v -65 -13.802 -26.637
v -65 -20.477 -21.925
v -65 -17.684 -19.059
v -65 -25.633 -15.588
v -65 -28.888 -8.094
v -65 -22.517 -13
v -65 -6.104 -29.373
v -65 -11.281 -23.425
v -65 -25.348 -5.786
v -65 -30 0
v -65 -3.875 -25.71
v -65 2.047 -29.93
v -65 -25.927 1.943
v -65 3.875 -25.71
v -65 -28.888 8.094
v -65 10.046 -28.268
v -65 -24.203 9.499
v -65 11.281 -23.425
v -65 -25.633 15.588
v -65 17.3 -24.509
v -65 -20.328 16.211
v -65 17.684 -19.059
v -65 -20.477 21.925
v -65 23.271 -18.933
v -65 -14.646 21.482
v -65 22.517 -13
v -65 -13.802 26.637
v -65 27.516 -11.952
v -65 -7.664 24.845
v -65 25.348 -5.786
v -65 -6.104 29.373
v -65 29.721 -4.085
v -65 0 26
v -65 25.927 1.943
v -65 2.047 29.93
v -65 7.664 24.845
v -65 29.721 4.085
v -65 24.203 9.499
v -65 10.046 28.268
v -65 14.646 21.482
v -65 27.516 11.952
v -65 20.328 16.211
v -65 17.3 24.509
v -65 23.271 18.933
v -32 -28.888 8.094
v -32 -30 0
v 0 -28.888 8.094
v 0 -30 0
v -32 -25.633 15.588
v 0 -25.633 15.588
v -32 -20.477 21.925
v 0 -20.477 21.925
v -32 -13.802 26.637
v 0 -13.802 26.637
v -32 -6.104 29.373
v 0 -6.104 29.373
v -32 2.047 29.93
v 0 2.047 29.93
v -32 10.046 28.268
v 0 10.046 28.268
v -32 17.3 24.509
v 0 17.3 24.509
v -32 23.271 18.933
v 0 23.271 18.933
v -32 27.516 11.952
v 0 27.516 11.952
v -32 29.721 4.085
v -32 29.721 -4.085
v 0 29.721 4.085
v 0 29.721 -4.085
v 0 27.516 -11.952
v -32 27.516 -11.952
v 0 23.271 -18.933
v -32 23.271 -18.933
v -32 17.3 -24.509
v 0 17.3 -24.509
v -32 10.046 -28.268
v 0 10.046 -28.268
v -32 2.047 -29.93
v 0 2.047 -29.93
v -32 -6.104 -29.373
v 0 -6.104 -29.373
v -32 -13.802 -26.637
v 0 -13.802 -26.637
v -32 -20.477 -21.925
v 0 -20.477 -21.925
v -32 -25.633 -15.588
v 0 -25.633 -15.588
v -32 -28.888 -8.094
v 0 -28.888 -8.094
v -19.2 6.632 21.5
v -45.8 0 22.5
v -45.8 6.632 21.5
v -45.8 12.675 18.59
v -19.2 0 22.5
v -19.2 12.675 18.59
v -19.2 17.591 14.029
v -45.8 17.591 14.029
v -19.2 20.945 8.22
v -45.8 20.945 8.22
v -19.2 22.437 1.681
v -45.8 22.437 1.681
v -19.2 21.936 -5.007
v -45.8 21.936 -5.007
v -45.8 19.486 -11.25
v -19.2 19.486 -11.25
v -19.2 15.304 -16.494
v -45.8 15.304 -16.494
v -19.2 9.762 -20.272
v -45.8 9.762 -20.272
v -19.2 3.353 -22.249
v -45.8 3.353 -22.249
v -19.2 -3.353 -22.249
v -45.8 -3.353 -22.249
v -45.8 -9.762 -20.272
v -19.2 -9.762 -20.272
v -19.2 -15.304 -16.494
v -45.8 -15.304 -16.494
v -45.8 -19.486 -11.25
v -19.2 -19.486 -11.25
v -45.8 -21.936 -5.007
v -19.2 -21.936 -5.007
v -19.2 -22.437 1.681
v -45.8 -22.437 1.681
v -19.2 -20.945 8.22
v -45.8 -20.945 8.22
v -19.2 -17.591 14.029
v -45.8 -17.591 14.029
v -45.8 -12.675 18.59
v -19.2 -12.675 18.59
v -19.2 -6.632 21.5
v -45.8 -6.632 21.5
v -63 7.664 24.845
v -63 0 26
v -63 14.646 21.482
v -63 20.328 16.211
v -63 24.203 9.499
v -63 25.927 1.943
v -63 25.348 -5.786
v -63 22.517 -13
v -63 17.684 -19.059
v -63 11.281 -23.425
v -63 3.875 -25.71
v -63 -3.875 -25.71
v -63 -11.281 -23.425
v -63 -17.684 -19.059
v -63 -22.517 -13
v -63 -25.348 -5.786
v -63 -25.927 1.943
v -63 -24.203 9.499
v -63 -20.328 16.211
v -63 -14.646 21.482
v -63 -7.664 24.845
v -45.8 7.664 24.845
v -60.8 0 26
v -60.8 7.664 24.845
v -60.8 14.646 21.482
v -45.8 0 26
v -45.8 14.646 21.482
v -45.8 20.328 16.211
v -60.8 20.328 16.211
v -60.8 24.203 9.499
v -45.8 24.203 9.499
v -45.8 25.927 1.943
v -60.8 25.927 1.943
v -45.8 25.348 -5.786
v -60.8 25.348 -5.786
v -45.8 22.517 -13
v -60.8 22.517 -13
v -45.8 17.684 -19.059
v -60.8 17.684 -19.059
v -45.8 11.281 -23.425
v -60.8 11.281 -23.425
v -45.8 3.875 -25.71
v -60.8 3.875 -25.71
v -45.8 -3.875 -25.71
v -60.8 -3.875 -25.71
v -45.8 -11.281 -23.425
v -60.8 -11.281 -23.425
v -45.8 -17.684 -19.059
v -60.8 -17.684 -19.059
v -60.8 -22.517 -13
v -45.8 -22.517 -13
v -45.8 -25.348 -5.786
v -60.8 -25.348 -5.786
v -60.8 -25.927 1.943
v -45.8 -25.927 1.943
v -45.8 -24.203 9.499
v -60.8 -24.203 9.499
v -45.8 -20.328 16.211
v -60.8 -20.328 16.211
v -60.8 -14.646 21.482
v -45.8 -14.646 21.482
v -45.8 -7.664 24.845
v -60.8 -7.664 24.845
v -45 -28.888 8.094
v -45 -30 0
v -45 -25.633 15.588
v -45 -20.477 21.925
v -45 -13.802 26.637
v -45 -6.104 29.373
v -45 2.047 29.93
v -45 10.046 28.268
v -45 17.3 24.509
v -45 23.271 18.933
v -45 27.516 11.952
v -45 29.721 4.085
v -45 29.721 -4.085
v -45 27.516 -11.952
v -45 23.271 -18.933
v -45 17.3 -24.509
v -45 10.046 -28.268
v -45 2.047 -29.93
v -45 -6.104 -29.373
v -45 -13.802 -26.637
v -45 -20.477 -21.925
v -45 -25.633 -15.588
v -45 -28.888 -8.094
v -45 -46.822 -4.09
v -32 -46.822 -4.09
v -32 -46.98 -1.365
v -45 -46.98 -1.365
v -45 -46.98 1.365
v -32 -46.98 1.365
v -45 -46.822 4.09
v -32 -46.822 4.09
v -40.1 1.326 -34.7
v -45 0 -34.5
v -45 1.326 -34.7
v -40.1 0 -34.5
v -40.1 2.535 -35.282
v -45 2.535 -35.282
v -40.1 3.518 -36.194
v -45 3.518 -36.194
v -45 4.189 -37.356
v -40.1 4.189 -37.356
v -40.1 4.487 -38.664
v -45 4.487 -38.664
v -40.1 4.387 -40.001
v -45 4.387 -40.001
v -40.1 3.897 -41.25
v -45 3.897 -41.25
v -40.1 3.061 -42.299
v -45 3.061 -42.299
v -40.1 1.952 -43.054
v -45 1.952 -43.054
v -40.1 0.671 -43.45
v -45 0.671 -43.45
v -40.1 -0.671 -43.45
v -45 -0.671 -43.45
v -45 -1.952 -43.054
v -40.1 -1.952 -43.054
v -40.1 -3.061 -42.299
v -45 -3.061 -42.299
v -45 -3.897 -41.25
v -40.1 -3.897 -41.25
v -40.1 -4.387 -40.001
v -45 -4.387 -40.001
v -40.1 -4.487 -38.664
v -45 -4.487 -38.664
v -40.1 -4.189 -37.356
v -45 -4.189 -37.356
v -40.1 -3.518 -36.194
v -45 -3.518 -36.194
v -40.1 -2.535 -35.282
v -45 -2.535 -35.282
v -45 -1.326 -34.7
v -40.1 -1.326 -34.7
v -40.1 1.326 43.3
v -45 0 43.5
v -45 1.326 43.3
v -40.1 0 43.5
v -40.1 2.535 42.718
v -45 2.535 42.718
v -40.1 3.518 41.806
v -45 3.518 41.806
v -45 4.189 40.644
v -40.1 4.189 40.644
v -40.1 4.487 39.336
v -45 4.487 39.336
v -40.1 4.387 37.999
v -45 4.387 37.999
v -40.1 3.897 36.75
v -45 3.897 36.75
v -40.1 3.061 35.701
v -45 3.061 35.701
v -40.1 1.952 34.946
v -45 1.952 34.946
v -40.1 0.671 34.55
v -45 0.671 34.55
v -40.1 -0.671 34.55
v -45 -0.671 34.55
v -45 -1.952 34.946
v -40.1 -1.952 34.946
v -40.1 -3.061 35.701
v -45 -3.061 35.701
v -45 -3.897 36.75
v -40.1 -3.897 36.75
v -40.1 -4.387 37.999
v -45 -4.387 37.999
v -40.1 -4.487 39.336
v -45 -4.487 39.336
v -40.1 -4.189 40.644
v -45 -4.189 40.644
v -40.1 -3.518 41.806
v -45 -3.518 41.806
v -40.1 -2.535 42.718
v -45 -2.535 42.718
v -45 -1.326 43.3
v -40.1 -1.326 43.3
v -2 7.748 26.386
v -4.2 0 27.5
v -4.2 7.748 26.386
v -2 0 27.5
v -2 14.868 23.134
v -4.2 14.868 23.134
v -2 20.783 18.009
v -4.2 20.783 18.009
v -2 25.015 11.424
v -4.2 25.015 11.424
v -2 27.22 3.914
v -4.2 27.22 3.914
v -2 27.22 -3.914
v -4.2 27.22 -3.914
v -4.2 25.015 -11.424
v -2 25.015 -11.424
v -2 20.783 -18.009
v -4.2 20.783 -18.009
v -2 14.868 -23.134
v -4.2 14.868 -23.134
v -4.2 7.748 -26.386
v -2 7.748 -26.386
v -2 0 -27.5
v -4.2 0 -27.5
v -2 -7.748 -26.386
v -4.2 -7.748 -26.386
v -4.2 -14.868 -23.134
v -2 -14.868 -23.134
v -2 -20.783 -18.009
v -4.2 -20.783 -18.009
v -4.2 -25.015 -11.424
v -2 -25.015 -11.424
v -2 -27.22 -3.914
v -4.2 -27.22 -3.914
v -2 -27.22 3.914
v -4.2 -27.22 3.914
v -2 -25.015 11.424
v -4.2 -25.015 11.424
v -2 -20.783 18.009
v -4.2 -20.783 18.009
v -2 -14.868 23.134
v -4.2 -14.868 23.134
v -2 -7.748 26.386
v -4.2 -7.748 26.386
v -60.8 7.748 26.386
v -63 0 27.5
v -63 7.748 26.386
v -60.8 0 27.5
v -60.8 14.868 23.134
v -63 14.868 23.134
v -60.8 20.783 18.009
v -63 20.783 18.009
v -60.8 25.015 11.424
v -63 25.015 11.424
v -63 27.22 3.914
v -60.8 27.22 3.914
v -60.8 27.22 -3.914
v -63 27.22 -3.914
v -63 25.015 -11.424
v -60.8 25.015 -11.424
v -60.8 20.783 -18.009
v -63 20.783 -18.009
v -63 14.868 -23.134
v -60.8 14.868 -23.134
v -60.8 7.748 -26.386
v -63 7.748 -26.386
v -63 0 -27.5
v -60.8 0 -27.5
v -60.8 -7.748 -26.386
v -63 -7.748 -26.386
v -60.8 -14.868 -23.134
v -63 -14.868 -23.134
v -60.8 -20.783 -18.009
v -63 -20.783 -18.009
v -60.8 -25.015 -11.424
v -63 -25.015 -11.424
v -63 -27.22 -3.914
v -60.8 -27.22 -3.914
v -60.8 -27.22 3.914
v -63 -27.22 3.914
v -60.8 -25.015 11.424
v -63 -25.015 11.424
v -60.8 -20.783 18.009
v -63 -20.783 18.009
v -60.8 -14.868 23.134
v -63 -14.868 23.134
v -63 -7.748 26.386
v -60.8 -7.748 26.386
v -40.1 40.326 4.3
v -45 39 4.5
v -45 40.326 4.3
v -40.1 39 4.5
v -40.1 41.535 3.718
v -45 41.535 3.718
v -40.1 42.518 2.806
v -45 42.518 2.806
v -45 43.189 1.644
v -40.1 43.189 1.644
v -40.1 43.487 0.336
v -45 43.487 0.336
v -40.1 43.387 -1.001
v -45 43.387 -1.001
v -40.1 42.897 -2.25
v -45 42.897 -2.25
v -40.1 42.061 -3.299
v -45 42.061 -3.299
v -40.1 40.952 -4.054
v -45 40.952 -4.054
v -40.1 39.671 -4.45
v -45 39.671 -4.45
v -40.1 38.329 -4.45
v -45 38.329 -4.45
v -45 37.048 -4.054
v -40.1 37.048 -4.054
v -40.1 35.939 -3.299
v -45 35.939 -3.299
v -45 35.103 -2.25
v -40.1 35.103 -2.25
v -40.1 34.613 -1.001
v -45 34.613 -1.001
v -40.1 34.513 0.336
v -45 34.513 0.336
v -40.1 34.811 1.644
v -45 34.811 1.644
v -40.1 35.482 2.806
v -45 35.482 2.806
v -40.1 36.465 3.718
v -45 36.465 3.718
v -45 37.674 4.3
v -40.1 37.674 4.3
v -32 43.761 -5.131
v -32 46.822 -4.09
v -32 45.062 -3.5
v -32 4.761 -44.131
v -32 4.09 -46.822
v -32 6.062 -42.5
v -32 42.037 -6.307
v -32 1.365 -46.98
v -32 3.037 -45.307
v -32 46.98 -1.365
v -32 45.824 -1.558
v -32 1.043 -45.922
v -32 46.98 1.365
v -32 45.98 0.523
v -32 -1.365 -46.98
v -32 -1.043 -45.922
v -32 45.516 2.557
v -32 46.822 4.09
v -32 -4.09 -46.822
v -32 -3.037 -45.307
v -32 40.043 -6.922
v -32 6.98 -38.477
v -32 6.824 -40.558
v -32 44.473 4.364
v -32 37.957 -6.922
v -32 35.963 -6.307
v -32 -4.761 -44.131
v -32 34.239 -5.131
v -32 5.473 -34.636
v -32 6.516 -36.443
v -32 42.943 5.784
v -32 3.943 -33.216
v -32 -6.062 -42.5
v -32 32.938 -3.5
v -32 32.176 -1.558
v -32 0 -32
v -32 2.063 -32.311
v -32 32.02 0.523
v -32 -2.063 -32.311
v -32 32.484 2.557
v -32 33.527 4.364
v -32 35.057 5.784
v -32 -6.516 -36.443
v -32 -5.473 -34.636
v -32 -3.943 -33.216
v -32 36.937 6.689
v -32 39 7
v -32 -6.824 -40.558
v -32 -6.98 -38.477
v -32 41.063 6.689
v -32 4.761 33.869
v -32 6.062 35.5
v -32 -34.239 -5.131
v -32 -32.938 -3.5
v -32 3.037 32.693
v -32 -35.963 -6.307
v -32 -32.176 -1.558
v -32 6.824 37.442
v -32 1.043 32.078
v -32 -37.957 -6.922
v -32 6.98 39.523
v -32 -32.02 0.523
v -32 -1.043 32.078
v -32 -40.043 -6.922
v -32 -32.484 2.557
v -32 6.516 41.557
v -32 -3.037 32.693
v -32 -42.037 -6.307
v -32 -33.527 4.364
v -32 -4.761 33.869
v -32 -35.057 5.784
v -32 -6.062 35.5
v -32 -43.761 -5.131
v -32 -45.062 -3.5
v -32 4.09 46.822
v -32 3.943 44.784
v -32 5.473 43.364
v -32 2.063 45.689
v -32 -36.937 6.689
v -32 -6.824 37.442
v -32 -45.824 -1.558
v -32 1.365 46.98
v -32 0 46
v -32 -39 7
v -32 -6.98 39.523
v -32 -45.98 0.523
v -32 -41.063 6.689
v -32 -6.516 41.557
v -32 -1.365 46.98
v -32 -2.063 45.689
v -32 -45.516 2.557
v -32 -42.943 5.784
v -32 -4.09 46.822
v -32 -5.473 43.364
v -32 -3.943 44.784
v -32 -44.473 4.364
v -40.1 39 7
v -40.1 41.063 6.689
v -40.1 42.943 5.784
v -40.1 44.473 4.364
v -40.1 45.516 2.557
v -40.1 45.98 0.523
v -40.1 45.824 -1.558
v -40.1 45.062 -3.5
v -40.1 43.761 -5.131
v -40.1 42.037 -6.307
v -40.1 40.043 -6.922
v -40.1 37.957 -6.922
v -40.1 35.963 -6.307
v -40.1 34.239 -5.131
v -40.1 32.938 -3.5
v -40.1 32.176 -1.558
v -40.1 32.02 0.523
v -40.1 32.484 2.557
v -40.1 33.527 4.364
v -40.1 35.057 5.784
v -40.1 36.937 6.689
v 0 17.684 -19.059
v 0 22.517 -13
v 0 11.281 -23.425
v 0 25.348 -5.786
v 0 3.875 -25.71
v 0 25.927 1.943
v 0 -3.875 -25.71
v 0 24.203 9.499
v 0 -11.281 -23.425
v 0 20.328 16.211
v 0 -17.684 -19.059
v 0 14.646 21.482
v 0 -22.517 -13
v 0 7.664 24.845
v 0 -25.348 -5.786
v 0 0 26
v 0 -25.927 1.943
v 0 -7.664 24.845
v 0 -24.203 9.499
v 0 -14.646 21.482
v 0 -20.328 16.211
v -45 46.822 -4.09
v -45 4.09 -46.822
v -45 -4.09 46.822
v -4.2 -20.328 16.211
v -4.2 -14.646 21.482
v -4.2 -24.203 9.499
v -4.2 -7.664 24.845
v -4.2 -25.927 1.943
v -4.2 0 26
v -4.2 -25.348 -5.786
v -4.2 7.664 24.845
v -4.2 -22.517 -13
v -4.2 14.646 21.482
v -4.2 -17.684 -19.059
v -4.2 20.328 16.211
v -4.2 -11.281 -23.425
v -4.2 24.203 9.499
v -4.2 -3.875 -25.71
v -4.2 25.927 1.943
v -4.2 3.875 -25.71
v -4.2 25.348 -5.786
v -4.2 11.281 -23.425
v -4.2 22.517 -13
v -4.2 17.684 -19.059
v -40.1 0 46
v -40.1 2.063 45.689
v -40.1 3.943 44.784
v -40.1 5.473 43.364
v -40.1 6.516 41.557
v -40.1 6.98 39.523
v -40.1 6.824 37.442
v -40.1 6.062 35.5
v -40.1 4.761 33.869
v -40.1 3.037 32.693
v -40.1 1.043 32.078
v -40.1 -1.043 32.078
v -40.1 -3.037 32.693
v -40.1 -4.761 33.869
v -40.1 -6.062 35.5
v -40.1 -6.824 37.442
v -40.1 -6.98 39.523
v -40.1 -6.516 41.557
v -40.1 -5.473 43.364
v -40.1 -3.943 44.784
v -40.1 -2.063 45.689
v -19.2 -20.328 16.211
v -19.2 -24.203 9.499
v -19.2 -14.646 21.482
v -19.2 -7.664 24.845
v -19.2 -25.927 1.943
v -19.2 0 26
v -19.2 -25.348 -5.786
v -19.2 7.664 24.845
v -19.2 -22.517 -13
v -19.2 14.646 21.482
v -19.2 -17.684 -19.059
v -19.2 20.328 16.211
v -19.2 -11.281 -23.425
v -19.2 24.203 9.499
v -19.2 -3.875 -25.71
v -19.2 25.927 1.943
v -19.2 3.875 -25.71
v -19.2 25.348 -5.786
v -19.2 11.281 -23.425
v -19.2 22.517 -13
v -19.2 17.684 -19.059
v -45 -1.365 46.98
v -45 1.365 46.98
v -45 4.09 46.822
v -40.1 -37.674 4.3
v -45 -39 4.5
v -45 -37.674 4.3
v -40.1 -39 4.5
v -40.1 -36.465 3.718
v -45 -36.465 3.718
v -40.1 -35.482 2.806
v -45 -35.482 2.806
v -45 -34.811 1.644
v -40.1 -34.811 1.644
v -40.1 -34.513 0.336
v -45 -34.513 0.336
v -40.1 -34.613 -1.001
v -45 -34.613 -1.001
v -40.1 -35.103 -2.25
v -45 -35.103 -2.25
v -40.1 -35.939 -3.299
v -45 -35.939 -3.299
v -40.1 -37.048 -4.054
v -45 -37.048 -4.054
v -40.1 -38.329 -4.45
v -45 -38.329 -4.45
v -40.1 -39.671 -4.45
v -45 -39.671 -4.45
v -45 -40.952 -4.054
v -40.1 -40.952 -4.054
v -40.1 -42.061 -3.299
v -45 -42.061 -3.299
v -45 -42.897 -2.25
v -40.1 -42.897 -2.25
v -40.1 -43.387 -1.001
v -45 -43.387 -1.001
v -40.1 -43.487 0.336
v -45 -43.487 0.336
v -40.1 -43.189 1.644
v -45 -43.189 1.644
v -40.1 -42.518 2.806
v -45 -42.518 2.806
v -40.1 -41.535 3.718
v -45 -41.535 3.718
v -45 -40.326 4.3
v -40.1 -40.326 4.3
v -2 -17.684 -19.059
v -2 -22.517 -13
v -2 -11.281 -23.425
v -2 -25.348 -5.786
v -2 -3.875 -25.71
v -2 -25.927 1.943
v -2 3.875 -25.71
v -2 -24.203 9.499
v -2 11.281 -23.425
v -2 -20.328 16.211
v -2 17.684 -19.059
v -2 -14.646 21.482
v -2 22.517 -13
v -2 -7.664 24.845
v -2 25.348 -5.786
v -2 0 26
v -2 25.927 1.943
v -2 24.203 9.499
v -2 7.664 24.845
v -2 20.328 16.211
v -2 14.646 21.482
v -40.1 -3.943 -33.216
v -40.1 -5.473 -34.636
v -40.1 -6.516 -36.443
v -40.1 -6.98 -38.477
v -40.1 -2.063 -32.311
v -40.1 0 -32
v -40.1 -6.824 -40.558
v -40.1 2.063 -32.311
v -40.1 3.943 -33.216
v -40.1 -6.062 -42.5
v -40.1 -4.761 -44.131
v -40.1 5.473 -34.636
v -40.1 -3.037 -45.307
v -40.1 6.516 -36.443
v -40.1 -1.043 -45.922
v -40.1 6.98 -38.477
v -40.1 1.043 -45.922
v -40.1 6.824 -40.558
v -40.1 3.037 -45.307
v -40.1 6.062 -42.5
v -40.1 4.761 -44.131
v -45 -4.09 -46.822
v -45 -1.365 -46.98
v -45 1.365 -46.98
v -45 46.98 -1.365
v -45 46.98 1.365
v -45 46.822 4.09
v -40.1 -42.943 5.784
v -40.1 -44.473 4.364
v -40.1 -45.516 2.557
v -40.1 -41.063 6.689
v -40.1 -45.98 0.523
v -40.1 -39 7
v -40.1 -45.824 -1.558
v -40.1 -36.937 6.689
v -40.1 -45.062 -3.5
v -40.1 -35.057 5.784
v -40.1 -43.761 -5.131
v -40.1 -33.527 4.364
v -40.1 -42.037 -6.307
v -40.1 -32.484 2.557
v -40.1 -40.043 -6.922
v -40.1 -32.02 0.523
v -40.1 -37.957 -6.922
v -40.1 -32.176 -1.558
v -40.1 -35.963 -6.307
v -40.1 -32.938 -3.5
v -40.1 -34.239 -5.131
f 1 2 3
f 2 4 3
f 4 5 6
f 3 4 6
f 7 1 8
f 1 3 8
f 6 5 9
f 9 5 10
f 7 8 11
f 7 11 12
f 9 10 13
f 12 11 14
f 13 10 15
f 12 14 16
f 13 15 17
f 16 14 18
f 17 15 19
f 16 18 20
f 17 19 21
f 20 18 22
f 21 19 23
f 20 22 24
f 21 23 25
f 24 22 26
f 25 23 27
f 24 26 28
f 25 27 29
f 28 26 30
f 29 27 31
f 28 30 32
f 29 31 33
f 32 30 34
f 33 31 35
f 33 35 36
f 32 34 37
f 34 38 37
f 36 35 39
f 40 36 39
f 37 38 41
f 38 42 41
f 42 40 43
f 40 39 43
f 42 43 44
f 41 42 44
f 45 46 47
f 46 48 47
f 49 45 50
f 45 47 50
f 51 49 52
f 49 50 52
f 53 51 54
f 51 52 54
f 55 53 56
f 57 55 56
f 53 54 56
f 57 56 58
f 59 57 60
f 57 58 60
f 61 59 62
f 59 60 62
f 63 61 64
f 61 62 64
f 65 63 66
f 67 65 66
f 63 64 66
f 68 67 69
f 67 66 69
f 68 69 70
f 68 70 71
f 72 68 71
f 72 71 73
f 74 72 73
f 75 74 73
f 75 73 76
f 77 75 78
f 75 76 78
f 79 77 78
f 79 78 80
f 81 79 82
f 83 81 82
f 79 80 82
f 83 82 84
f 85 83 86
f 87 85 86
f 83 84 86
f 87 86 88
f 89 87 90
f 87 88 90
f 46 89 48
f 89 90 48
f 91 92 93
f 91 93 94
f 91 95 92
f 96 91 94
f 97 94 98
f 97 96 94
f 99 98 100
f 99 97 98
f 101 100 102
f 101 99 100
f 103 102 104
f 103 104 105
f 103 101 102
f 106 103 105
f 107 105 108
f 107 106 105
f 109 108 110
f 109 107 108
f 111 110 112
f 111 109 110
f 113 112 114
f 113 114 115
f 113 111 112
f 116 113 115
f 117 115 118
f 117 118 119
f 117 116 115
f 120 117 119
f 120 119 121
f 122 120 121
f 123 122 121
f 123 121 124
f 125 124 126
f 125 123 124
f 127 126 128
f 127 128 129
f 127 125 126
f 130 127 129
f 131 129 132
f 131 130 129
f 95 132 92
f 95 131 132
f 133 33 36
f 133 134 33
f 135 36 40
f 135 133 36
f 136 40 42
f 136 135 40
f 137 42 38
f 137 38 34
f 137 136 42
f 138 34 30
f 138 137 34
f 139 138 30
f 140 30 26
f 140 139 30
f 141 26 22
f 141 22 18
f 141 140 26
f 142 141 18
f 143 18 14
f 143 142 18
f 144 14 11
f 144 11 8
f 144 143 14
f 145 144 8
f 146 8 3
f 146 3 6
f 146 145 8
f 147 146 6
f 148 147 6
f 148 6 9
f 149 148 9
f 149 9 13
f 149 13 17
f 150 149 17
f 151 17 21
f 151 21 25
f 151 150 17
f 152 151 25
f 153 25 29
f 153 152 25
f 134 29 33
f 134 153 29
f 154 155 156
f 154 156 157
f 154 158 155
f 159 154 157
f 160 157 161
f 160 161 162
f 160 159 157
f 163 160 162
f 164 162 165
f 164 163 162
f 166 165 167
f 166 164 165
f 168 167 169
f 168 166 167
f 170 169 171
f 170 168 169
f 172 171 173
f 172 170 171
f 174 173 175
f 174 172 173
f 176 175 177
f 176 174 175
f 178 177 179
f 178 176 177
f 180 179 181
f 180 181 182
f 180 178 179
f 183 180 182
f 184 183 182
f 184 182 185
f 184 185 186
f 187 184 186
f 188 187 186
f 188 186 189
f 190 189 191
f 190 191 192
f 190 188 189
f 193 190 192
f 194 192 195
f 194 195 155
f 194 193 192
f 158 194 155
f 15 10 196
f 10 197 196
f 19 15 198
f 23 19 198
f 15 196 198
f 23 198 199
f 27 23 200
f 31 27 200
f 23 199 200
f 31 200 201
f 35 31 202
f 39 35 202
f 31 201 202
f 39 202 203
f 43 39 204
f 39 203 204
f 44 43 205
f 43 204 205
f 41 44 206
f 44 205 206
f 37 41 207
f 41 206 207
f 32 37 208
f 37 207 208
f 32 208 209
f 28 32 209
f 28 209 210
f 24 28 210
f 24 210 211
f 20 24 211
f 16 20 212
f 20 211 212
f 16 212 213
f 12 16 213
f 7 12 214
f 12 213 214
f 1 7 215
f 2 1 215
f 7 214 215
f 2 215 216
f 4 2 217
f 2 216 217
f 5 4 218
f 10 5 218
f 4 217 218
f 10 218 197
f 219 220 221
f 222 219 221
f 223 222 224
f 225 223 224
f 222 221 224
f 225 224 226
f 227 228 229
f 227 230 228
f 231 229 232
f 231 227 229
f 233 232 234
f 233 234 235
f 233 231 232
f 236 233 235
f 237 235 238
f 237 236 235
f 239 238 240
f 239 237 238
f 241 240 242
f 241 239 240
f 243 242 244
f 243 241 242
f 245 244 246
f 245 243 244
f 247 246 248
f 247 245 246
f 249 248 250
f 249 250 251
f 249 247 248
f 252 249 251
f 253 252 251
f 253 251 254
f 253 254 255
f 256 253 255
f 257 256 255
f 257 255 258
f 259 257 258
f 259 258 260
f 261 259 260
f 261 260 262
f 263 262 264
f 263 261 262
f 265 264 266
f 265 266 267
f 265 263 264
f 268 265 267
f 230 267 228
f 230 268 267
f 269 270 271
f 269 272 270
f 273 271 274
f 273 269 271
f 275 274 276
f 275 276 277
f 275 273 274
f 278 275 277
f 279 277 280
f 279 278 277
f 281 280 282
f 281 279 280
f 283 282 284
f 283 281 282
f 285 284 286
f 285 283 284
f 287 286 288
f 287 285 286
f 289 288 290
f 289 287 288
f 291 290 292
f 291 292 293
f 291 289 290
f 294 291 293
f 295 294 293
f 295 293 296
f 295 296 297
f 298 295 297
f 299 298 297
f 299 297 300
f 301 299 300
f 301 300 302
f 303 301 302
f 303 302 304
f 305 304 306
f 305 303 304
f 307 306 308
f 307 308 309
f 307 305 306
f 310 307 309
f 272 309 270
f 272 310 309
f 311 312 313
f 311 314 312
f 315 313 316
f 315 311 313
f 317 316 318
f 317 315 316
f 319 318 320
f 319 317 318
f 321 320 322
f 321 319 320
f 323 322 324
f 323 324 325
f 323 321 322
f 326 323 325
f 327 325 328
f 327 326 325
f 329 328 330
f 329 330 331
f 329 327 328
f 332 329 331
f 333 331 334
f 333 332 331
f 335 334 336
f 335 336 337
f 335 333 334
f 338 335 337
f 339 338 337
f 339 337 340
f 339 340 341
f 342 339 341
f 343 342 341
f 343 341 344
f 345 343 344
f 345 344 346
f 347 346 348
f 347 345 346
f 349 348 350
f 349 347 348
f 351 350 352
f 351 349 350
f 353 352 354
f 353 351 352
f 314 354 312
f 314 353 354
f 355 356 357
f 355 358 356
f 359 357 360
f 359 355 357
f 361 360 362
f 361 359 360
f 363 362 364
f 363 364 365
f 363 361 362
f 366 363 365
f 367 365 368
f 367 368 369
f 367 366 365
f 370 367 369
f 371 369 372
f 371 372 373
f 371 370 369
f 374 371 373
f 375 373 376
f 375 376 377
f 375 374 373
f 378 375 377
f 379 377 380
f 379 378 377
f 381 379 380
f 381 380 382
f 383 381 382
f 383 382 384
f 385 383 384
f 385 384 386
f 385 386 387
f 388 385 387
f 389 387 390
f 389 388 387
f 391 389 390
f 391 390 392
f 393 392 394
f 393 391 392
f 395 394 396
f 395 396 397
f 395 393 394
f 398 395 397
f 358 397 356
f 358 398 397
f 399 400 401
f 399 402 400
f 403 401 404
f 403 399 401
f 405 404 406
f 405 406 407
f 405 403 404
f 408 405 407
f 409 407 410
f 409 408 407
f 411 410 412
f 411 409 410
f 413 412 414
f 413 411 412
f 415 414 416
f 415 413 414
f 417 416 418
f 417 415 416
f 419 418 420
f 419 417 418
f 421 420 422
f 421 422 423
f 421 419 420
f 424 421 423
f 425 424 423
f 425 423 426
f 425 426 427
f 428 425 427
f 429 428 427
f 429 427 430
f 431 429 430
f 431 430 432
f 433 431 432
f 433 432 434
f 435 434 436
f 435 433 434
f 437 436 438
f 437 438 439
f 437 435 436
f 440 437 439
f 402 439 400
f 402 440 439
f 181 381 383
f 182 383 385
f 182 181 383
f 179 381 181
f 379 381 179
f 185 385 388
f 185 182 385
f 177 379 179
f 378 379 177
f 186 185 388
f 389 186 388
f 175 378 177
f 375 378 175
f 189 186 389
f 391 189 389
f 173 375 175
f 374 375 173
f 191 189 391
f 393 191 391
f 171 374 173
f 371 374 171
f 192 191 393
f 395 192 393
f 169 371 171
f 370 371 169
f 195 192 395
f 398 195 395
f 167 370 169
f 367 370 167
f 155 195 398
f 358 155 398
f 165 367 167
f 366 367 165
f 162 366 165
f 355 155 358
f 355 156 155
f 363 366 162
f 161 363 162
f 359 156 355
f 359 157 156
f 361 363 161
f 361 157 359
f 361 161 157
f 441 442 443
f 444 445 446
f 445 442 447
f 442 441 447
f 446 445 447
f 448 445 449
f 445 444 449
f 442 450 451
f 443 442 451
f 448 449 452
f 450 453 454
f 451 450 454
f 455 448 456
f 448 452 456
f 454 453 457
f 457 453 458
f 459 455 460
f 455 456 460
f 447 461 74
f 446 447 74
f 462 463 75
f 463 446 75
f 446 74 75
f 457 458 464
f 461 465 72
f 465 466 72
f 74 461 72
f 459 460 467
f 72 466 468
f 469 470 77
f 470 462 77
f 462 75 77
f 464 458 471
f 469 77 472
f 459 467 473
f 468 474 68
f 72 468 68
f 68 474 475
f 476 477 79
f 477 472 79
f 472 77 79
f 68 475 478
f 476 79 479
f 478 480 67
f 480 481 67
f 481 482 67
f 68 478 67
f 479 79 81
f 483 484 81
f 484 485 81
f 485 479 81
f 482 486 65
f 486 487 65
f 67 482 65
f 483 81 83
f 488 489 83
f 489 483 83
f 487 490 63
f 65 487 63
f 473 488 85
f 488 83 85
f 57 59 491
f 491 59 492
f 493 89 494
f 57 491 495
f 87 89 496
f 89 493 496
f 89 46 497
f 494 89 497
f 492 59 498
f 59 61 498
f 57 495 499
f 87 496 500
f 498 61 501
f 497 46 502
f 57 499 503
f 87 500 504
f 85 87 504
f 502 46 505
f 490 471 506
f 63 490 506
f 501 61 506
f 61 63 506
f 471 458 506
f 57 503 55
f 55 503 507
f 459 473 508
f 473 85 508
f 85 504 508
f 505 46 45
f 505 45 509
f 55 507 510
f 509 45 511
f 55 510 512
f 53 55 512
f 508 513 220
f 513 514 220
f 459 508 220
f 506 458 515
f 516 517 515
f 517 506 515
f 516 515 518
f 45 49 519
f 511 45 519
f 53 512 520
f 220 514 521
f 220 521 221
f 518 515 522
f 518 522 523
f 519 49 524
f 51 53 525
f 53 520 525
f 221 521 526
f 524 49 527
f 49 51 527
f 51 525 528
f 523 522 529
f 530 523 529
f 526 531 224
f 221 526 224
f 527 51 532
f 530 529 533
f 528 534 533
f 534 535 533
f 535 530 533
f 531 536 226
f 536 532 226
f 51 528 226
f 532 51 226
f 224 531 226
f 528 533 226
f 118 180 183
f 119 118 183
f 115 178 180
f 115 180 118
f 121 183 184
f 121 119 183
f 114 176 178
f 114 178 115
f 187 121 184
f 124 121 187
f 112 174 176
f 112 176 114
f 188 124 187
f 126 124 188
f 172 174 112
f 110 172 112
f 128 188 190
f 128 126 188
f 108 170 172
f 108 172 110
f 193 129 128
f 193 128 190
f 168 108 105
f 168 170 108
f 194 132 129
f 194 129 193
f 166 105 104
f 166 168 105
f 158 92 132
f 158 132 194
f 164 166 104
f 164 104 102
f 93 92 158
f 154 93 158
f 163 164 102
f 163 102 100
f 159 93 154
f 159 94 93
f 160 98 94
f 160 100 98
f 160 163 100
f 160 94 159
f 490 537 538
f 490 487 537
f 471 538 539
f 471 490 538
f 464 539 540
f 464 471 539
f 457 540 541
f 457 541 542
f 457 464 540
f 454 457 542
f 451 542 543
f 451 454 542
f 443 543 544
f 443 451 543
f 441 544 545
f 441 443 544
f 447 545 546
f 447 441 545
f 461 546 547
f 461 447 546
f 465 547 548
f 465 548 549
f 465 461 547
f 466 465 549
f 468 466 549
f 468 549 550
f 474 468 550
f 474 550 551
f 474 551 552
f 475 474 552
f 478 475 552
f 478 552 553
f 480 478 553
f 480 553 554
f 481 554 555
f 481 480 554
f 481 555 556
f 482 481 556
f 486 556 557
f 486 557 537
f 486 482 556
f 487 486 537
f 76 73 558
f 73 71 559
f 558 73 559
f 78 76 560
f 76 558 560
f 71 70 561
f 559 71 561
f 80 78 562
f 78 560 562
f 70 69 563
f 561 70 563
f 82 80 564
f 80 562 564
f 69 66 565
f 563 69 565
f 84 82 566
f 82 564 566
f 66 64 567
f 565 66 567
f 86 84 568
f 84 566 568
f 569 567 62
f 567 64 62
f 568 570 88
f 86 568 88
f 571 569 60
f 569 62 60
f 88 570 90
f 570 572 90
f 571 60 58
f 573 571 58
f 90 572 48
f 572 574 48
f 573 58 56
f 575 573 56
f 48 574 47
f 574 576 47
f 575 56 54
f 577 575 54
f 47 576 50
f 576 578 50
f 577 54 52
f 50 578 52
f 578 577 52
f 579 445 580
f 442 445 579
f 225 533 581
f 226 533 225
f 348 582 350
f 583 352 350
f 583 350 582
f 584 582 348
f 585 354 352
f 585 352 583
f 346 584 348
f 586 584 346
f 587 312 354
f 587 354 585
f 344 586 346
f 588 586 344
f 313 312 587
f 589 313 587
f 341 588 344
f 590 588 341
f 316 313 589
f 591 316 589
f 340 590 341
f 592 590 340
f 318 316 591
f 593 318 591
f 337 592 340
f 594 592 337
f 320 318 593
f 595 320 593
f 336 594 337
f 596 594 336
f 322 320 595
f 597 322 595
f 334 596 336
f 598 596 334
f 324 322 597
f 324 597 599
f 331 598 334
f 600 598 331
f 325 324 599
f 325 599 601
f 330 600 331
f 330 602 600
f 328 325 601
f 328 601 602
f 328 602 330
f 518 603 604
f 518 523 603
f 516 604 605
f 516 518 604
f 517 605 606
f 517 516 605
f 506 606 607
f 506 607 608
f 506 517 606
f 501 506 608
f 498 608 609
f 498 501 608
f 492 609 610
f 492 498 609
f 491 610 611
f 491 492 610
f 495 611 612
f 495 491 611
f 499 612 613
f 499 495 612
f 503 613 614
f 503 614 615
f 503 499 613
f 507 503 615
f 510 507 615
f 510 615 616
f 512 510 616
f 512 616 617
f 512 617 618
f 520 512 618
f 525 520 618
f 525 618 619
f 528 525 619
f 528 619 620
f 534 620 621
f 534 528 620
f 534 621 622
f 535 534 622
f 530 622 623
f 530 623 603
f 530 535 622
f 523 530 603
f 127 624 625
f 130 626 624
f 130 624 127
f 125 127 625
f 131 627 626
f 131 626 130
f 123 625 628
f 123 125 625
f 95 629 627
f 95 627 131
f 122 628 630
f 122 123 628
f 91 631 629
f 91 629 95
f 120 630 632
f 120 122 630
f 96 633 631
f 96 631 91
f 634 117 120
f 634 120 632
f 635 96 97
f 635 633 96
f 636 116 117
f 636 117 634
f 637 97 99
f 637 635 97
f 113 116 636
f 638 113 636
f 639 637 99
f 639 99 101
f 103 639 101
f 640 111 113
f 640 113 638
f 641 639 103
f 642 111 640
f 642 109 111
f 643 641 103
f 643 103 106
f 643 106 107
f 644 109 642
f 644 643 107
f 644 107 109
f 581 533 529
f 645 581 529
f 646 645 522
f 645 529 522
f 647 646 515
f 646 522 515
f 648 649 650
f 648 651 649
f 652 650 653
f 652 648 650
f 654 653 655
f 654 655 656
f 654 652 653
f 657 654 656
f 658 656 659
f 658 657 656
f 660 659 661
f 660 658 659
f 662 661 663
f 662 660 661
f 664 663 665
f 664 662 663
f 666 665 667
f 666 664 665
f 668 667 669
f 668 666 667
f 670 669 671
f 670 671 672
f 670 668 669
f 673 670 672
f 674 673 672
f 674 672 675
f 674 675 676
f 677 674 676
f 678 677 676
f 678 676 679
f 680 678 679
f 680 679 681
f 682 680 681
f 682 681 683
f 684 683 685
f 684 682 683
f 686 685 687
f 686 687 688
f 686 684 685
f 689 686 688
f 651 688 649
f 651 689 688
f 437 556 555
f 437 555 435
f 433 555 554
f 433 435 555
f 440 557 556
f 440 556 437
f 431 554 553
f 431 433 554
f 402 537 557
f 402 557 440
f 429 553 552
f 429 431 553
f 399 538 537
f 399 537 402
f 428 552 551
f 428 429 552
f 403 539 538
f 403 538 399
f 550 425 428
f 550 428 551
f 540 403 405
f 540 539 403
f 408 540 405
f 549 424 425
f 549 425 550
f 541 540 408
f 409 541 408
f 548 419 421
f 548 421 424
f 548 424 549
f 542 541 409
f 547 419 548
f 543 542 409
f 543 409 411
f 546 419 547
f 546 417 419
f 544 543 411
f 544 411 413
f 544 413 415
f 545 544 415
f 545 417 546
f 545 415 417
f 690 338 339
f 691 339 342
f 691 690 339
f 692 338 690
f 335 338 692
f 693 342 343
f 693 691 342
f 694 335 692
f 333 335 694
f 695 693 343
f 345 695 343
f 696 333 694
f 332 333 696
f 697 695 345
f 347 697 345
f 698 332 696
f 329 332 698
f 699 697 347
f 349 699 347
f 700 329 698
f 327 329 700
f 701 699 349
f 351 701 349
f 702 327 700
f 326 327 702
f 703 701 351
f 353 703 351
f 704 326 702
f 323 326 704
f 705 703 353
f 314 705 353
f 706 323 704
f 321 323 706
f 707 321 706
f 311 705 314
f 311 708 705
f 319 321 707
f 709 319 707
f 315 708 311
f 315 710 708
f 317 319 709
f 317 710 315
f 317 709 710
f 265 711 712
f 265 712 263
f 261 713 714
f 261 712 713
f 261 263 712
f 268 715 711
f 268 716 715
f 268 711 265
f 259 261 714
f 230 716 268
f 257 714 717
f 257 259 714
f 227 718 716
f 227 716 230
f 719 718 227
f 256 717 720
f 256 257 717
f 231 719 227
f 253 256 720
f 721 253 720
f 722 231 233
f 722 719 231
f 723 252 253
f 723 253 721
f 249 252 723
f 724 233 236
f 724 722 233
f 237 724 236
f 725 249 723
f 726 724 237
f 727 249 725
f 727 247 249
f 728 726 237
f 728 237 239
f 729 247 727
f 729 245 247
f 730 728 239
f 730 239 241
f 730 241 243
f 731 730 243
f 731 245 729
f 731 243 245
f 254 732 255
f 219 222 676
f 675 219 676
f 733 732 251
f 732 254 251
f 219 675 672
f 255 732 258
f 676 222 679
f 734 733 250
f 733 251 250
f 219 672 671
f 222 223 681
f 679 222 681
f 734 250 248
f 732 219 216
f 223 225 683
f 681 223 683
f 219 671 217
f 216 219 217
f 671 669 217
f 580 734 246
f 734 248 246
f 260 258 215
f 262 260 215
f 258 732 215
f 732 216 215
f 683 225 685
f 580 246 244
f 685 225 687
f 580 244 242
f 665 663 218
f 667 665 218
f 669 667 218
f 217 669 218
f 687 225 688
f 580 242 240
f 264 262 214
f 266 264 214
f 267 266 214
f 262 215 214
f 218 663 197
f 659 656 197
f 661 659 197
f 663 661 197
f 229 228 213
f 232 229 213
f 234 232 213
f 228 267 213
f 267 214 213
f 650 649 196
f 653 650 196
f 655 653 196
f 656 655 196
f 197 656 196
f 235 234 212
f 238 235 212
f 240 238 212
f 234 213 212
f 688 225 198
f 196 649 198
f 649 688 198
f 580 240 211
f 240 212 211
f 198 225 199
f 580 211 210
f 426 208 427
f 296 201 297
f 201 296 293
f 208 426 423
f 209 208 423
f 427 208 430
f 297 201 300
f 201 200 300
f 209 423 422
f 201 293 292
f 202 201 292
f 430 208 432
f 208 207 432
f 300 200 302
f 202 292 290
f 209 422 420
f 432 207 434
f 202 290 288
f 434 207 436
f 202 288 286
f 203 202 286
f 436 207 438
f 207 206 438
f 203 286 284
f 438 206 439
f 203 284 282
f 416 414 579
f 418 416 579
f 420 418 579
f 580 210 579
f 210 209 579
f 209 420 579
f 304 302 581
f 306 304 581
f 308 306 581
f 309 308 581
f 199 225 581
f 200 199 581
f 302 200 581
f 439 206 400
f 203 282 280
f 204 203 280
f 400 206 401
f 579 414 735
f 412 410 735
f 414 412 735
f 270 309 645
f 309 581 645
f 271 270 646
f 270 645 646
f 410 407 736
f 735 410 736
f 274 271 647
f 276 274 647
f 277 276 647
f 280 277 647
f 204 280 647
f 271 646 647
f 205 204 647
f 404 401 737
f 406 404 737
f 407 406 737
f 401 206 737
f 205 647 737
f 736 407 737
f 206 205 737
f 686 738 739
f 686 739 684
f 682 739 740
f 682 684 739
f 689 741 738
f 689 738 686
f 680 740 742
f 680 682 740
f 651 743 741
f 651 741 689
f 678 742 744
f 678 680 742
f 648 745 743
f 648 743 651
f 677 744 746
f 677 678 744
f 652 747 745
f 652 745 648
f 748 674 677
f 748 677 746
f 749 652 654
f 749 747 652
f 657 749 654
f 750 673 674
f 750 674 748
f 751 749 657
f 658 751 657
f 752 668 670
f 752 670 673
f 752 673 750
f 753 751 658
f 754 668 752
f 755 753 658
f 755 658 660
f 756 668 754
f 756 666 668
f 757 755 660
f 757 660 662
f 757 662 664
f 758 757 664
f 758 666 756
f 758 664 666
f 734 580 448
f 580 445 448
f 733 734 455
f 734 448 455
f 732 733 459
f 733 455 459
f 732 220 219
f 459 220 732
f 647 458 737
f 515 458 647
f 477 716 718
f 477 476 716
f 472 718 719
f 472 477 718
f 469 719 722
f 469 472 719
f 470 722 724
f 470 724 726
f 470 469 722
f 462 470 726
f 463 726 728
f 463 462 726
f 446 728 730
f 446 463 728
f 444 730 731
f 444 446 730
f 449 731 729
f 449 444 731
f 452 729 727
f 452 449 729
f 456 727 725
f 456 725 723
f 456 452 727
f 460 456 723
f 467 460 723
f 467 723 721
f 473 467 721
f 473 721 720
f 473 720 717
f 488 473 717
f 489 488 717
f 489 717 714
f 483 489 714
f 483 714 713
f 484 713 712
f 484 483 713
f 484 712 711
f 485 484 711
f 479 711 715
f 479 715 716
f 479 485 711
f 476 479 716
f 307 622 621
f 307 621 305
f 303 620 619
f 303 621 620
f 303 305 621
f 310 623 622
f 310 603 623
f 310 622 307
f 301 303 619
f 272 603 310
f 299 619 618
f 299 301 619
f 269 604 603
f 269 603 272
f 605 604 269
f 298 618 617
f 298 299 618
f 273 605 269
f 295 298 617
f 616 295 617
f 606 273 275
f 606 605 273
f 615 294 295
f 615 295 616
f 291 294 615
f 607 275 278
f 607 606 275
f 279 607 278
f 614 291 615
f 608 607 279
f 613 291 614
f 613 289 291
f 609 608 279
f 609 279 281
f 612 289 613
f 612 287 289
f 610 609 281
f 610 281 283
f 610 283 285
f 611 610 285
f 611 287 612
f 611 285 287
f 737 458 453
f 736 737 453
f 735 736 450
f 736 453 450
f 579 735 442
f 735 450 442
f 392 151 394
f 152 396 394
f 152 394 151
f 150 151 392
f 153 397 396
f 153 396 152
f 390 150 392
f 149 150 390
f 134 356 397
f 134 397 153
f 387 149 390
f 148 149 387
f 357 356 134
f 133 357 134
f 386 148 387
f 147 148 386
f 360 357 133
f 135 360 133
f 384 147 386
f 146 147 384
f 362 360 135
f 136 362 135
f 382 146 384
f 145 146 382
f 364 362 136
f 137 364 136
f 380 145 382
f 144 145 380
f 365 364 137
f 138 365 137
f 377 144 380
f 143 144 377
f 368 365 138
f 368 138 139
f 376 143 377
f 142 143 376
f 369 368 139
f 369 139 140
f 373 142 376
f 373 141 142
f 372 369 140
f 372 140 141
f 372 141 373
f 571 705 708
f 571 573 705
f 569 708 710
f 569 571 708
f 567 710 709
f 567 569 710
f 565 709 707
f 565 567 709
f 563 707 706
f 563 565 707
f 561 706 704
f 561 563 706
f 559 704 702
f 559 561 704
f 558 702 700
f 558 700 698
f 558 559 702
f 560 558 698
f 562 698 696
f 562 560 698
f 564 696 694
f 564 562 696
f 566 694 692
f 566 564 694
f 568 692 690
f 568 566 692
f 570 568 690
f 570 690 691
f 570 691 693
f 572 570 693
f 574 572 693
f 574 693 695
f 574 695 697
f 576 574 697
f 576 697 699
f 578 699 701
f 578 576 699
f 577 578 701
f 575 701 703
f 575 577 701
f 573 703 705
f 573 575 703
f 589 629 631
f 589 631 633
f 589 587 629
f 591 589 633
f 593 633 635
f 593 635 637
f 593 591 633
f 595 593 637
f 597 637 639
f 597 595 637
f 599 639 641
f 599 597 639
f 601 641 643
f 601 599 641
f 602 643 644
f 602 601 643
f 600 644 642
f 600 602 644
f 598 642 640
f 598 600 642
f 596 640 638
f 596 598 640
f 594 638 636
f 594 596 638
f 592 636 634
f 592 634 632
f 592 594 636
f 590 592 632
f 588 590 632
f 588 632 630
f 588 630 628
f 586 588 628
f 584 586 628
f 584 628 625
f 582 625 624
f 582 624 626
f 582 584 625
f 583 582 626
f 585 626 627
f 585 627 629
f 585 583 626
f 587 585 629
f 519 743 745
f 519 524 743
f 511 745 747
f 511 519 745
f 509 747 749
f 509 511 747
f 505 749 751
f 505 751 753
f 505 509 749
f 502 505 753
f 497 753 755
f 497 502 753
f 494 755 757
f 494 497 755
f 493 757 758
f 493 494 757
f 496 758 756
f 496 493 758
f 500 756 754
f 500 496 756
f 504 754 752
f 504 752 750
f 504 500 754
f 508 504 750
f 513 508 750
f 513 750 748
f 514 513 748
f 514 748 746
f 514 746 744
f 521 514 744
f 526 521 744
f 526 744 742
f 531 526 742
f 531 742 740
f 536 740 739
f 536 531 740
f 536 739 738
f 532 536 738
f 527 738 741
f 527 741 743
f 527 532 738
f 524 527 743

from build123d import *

# Parameters (mm, degrees)
SKETCH7_R          = 72
CUT_EXTRUDE1_DEPTH = 13


with BuildPart() as part:
    # Sketch1 → Revolve1 (revolve)
    with BuildSketch(Plane.XY, mode=Mode.PRIVATE) as revolve1_sk:
        Polygon((-65, 0), (-65, 30), (-45, 30), (-45, 47), (-32, 47), (-32, 30), (0, 30), (0, 0), align=None)
    revolve(revolve1_sk.sketch.rotate(Axis((0, 0, 0), (-1, 0, 0)), 180), axis=Axis((0, 0, 0), (-1, 0, 0)))

    # Sketch2 → Cut-Revolve1 (revolve, cut)
    with BuildSketch(Plane.XY, mode=Mode.PRIVATE) as cut_revolve1_sk:
        Polygon((-65, 0), (-65, 26), (-63, 26), (-63, 27.5), (-60.8, 27.5), (-60.8, 26), (-45.8, 26), (-45.8, 22.5), (-19.2, 22.5), (-19.2, 26), (-4.2, 26), (-4.2, 27.5), (-2, 27.5), (-2, 26), (0, 26), (0, 0), align=None)
    revolve(cut_revolve1_sk.sketch.rotate(Axis((0, 0, 0), (-1, 0, 0)), 270), axis=Axis((0, 0, 0), (-1, 0, 0)), mode=Mode.SUBTRACT)

    # Sketch3 → Cut-Revolve2 (revolve, cut)
    with BuildSketch(Plane.XY, mode=Mode.PRIVATE) as cut_revolve2_sk:
        Polygon((-45, 39), (-45, 43.5), (-40.1, 43.5), (-40.1, 46), (-32, 46), (-32, 39), align=None)
    revolve(cut_revolve2_sk.sketch.rotate(Axis((-32, 39, 0), (-1, 0, 0)), 270), axis=Axis((-32, 39, 0), (-1, 0, 0)), mode=Mode.SUBTRACT)

    # Sketch4 → Cut-Revolve3 (revolve, cut)
    with BuildSketch(Plane.XY.offset(39), mode=Mode.PRIVATE) as cut_revolve3_sk:
        Polygon((-45, 0), (-45, 4.5), (-40.1, 4.5), (-40.1, 7), (-32, 7), (-32, 0), align=None)
    revolve(cut_revolve3_sk.sketch.rotate(Axis((-32, 0, 39), (-1, 0, 0)), 270), axis=Axis((-32, 0, 39), (-1, 0, 0)), mode=Mode.SUBTRACT)

    # Sketch5 → Cut-Revolve4 (revolve, cut)
    with BuildSketch(Plane.XY, mode=Mode.PRIVATE) as cut_revolve4_sk:
        Polygon((-45, -39), (-45, -34.5), (-40.1, -34.5), (-40.1, -32), (-32, -32), (-32, -39), align=None)
    revolve(cut_revolve4_sk.sketch.rotate(Axis((-32, -39, 0), (-1, 0, 0)), 270), axis=Axis((-32, -39, 0), (-1, 0, 0)), mode=Mode.SUBTRACT)

    # Sketch6 → Cut-Revolve5 (revolve, cut)
    with BuildSketch(Plane.XY.offset(-39), mode=Mode.PRIVATE) as cut_revolve5_sk:
        Polygon((-45, 0), (-45, 4.5), (-40.1, 4.5), (-40.1, 7), (-32, 7), (-32, 0), align=None)
    revolve(cut_revolve5_sk.sketch.rotate(Axis((-32, 0, -39), (-1, 0, 0)), 270), axis=Axis((-32, 0, -39), (-1, 0, 0)), mode=Mode.SUBTRACT)

    # Sketch7 → Cut-Extrude1 (cut)
    with BuildSketch(Plane(origin=(-32, 0, 0), x_dir=(0, 0, -1), z_dir=(1, 0, 0))):
        Circle(SKETCH7_R)
        Polygon((-50.911688245, 0), (0, -50.911688245), (50.911688245, 0), (0, 50.911688245), align=None, mode=Mode.SUBTRACT)
    extrude(amount=-CUT_EXTRUDE1_DEPTH, mode=Mode.SUBTRACT)


solid = part.part
